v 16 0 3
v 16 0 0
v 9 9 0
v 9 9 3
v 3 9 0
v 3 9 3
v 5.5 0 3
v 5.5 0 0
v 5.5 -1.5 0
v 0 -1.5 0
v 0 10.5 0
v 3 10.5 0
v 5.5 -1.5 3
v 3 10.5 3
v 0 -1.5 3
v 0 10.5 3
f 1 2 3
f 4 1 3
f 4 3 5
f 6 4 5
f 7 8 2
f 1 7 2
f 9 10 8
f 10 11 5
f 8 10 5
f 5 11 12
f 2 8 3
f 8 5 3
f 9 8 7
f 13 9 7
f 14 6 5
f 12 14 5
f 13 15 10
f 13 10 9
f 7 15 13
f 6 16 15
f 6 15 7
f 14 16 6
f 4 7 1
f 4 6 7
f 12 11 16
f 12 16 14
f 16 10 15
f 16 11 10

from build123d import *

# Parameters (mm, degrees)
EXTRUDE_1_DEPTH = 3
SKETCH_2_W      = 3
SKETCH_2_H      = 3
EXTRUDE_2_DEPTH = 1.5
SKETCH_3_W      = 5.5
SKETCH_3_H      = 3
EXTRUDE_3_DEPTH = 1.5


with BuildPart() as part:
    # Эскиз1 → Бобышка-Вытянуть1 (new body)
    with BuildSketch(Plane.XY):
        Polygon((0, 9), (0, 0), (16, 0), (9, 9), align=None)
    extrude(amount=EXTRUDE_1_DEPTH)

    # Эскиз2 → Бобышка-Вытянуть2 (add)
    with BuildSketch(Plane(origin=(0, 9, 0), x_dir=(1, 0, 0), z_dir=(0, 1, 0))):
        with Locations((1.5, -1.5)):
            Rectangle(SKETCH_2_W, SKETCH_2_H)
    extrude(amount=EXTRUDE_2_DEPTH)

    # Эскиз3 → Бобышка-Вытянуть3 (add)
    with BuildSketch(Plane.XZ):
        with Locations((2.75, 1.5)):
            Rectangle(SKETCH_3_W, SKETCH_3_H)
    extrude(amount=EXTRUDE_3_DEPTH)


solid = part.part
